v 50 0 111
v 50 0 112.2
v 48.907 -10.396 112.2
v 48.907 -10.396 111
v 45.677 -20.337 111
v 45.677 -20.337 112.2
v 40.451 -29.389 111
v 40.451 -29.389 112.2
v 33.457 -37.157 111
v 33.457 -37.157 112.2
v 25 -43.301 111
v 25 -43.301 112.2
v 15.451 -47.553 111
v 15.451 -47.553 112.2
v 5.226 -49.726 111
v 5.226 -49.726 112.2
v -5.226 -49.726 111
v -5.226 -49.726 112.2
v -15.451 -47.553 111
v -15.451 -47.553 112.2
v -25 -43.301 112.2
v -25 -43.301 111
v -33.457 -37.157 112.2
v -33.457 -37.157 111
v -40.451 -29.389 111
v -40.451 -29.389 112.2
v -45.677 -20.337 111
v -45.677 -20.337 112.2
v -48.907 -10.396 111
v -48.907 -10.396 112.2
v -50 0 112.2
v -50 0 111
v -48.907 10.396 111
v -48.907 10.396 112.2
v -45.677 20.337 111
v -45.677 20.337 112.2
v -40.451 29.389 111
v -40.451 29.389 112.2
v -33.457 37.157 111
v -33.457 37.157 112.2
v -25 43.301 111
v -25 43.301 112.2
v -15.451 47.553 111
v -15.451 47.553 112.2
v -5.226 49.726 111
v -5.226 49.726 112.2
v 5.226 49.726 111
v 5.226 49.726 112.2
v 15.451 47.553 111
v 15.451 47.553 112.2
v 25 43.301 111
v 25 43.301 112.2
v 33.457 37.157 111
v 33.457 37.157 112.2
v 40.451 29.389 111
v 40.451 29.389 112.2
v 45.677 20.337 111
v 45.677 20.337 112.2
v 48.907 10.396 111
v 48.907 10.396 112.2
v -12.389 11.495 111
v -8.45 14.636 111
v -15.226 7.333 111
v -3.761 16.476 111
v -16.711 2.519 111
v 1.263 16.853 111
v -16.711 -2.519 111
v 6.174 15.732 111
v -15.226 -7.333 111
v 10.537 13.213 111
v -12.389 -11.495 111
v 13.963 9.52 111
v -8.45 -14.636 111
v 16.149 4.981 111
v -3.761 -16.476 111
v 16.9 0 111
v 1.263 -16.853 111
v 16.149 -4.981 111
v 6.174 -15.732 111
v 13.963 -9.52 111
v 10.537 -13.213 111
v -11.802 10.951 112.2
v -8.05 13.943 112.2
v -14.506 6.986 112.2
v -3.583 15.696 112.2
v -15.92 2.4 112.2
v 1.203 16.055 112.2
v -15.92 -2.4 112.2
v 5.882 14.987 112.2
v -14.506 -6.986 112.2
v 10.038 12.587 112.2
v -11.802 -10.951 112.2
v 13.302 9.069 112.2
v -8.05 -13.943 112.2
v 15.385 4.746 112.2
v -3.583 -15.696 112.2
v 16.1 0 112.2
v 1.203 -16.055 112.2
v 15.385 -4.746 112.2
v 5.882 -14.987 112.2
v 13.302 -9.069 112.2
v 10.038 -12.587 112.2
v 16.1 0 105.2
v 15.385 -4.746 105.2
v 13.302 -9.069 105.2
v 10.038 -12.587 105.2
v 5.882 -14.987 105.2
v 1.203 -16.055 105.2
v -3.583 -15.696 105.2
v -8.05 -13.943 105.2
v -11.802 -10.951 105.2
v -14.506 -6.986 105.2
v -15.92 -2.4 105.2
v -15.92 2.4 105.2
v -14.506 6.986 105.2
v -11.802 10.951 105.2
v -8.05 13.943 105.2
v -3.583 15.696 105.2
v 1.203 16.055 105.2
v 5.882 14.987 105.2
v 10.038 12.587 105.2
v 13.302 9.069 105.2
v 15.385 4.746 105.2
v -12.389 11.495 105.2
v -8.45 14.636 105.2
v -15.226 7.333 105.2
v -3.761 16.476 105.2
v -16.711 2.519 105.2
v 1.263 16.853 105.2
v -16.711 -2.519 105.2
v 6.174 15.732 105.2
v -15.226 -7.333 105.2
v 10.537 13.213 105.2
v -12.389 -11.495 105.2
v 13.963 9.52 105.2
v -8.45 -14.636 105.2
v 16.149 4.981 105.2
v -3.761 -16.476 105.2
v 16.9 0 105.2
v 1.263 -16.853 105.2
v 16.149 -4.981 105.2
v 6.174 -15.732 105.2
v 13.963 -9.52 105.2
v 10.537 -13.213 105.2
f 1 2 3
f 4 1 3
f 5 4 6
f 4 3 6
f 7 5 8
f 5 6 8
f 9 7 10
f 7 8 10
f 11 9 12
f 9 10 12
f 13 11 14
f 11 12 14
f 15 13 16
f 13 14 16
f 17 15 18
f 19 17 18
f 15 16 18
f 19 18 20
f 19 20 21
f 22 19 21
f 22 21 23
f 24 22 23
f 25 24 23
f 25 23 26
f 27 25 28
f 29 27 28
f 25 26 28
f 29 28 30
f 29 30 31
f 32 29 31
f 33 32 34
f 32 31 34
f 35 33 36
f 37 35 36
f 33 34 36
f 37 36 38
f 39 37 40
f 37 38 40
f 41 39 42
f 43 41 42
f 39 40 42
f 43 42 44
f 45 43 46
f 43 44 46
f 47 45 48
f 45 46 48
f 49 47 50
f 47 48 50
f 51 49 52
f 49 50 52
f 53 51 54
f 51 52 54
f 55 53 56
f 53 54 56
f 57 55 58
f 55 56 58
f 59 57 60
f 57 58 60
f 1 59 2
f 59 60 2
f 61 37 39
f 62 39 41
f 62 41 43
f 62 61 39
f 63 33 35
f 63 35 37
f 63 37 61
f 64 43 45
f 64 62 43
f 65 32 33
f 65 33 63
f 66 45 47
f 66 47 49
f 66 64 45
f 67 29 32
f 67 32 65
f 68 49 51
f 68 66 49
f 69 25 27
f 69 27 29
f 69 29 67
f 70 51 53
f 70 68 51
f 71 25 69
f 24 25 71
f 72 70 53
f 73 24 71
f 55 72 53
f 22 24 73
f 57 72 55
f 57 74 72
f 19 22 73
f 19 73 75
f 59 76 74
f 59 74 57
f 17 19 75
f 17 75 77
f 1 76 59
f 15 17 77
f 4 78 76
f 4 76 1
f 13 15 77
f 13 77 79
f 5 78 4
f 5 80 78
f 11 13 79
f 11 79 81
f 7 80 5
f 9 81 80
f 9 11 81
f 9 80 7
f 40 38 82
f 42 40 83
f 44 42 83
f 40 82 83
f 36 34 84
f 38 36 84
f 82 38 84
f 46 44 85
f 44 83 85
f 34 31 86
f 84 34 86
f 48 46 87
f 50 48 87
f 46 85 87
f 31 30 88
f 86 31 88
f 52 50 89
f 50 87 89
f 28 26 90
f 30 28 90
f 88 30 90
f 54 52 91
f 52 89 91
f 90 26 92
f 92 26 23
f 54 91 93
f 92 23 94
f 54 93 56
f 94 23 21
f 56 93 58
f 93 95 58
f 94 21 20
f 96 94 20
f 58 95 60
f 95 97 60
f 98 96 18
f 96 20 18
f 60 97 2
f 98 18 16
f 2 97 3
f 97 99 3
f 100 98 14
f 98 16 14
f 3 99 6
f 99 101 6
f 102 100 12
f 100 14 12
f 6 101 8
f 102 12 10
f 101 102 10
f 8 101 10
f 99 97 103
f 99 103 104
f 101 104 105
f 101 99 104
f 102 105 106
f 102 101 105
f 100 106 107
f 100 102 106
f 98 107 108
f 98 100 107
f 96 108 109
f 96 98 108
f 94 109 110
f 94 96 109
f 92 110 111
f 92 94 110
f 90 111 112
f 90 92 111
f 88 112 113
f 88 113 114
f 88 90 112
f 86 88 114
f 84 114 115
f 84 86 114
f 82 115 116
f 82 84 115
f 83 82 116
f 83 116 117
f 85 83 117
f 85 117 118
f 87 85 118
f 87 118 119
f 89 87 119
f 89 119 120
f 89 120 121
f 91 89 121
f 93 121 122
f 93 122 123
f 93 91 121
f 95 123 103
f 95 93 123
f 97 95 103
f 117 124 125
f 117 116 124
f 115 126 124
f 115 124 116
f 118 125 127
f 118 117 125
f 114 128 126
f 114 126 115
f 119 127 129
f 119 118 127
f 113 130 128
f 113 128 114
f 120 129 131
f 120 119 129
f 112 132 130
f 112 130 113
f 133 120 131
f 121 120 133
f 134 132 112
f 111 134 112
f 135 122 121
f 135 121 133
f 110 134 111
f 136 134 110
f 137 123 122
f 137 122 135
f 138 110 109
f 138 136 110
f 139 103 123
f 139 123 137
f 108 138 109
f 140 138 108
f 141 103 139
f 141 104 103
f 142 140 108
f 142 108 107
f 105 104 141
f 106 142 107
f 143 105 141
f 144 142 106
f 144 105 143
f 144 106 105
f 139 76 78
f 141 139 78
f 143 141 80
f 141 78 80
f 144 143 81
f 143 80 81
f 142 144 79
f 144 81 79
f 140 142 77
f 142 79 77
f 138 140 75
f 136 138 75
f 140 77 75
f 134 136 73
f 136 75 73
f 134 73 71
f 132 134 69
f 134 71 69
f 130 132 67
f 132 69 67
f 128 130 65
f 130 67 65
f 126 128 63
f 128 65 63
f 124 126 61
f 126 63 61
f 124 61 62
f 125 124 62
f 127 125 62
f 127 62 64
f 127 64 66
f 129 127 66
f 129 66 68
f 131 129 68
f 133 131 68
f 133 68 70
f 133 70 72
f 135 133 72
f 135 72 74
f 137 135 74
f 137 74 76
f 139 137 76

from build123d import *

# Parameters (mm, degrees)
CYLINDER497_R          = 16.1
CYLINDER497_DEPTH      = 7
CYLINDER499_R          = 50
CYLINDER499_DEPTH      = 1.2
CYLINDER498_R          = 16.9
CYLINDER498_DEPTH      = 7
CUT238_PLACEMENT_ANGLE = 180


with BuildPart() as cylinder497:
    # Cylinder497 → Cylinder497 (new body)
    with BuildSketch(Plane.XY):
        Circle(CYLINDER497_R)
    extrude(amount=CYLINDER497_DEPTH)


with BuildPart() as cylinder499:
    # Cylinder499 → Cylinder499 (new body)
    with BuildSketch(Plane.XY):
        Circle(CYLINDER499_R)
    extrude(amount=CYLINDER499_DEPTH)


with BuildPart() as blades_top:
    # Cylinder498 → Cylinder498 (new body)
    with BuildSketch(Plane.XY):
        Circle(CYLINDER498_R)
    extrude(amount=CYLINDER498_DEPTH)

    # Fusion255: union Cylinder499
    add(cylinder499.part)

    # Cut238: cut Cylinder497
    add(cylinder497.part, mode=Mode.SUBTRACT)


with BuildPart() as blades_top_1:
    # Cut238 placement: moved
    add(blades_top.part.moved(Location((0, 0, 112.2))).rotate(Axis((0, 0, 112.2), (1, 0, 0)), CUT238_PLACEMENT_ANGLE))


solid = blades_top_1.part
